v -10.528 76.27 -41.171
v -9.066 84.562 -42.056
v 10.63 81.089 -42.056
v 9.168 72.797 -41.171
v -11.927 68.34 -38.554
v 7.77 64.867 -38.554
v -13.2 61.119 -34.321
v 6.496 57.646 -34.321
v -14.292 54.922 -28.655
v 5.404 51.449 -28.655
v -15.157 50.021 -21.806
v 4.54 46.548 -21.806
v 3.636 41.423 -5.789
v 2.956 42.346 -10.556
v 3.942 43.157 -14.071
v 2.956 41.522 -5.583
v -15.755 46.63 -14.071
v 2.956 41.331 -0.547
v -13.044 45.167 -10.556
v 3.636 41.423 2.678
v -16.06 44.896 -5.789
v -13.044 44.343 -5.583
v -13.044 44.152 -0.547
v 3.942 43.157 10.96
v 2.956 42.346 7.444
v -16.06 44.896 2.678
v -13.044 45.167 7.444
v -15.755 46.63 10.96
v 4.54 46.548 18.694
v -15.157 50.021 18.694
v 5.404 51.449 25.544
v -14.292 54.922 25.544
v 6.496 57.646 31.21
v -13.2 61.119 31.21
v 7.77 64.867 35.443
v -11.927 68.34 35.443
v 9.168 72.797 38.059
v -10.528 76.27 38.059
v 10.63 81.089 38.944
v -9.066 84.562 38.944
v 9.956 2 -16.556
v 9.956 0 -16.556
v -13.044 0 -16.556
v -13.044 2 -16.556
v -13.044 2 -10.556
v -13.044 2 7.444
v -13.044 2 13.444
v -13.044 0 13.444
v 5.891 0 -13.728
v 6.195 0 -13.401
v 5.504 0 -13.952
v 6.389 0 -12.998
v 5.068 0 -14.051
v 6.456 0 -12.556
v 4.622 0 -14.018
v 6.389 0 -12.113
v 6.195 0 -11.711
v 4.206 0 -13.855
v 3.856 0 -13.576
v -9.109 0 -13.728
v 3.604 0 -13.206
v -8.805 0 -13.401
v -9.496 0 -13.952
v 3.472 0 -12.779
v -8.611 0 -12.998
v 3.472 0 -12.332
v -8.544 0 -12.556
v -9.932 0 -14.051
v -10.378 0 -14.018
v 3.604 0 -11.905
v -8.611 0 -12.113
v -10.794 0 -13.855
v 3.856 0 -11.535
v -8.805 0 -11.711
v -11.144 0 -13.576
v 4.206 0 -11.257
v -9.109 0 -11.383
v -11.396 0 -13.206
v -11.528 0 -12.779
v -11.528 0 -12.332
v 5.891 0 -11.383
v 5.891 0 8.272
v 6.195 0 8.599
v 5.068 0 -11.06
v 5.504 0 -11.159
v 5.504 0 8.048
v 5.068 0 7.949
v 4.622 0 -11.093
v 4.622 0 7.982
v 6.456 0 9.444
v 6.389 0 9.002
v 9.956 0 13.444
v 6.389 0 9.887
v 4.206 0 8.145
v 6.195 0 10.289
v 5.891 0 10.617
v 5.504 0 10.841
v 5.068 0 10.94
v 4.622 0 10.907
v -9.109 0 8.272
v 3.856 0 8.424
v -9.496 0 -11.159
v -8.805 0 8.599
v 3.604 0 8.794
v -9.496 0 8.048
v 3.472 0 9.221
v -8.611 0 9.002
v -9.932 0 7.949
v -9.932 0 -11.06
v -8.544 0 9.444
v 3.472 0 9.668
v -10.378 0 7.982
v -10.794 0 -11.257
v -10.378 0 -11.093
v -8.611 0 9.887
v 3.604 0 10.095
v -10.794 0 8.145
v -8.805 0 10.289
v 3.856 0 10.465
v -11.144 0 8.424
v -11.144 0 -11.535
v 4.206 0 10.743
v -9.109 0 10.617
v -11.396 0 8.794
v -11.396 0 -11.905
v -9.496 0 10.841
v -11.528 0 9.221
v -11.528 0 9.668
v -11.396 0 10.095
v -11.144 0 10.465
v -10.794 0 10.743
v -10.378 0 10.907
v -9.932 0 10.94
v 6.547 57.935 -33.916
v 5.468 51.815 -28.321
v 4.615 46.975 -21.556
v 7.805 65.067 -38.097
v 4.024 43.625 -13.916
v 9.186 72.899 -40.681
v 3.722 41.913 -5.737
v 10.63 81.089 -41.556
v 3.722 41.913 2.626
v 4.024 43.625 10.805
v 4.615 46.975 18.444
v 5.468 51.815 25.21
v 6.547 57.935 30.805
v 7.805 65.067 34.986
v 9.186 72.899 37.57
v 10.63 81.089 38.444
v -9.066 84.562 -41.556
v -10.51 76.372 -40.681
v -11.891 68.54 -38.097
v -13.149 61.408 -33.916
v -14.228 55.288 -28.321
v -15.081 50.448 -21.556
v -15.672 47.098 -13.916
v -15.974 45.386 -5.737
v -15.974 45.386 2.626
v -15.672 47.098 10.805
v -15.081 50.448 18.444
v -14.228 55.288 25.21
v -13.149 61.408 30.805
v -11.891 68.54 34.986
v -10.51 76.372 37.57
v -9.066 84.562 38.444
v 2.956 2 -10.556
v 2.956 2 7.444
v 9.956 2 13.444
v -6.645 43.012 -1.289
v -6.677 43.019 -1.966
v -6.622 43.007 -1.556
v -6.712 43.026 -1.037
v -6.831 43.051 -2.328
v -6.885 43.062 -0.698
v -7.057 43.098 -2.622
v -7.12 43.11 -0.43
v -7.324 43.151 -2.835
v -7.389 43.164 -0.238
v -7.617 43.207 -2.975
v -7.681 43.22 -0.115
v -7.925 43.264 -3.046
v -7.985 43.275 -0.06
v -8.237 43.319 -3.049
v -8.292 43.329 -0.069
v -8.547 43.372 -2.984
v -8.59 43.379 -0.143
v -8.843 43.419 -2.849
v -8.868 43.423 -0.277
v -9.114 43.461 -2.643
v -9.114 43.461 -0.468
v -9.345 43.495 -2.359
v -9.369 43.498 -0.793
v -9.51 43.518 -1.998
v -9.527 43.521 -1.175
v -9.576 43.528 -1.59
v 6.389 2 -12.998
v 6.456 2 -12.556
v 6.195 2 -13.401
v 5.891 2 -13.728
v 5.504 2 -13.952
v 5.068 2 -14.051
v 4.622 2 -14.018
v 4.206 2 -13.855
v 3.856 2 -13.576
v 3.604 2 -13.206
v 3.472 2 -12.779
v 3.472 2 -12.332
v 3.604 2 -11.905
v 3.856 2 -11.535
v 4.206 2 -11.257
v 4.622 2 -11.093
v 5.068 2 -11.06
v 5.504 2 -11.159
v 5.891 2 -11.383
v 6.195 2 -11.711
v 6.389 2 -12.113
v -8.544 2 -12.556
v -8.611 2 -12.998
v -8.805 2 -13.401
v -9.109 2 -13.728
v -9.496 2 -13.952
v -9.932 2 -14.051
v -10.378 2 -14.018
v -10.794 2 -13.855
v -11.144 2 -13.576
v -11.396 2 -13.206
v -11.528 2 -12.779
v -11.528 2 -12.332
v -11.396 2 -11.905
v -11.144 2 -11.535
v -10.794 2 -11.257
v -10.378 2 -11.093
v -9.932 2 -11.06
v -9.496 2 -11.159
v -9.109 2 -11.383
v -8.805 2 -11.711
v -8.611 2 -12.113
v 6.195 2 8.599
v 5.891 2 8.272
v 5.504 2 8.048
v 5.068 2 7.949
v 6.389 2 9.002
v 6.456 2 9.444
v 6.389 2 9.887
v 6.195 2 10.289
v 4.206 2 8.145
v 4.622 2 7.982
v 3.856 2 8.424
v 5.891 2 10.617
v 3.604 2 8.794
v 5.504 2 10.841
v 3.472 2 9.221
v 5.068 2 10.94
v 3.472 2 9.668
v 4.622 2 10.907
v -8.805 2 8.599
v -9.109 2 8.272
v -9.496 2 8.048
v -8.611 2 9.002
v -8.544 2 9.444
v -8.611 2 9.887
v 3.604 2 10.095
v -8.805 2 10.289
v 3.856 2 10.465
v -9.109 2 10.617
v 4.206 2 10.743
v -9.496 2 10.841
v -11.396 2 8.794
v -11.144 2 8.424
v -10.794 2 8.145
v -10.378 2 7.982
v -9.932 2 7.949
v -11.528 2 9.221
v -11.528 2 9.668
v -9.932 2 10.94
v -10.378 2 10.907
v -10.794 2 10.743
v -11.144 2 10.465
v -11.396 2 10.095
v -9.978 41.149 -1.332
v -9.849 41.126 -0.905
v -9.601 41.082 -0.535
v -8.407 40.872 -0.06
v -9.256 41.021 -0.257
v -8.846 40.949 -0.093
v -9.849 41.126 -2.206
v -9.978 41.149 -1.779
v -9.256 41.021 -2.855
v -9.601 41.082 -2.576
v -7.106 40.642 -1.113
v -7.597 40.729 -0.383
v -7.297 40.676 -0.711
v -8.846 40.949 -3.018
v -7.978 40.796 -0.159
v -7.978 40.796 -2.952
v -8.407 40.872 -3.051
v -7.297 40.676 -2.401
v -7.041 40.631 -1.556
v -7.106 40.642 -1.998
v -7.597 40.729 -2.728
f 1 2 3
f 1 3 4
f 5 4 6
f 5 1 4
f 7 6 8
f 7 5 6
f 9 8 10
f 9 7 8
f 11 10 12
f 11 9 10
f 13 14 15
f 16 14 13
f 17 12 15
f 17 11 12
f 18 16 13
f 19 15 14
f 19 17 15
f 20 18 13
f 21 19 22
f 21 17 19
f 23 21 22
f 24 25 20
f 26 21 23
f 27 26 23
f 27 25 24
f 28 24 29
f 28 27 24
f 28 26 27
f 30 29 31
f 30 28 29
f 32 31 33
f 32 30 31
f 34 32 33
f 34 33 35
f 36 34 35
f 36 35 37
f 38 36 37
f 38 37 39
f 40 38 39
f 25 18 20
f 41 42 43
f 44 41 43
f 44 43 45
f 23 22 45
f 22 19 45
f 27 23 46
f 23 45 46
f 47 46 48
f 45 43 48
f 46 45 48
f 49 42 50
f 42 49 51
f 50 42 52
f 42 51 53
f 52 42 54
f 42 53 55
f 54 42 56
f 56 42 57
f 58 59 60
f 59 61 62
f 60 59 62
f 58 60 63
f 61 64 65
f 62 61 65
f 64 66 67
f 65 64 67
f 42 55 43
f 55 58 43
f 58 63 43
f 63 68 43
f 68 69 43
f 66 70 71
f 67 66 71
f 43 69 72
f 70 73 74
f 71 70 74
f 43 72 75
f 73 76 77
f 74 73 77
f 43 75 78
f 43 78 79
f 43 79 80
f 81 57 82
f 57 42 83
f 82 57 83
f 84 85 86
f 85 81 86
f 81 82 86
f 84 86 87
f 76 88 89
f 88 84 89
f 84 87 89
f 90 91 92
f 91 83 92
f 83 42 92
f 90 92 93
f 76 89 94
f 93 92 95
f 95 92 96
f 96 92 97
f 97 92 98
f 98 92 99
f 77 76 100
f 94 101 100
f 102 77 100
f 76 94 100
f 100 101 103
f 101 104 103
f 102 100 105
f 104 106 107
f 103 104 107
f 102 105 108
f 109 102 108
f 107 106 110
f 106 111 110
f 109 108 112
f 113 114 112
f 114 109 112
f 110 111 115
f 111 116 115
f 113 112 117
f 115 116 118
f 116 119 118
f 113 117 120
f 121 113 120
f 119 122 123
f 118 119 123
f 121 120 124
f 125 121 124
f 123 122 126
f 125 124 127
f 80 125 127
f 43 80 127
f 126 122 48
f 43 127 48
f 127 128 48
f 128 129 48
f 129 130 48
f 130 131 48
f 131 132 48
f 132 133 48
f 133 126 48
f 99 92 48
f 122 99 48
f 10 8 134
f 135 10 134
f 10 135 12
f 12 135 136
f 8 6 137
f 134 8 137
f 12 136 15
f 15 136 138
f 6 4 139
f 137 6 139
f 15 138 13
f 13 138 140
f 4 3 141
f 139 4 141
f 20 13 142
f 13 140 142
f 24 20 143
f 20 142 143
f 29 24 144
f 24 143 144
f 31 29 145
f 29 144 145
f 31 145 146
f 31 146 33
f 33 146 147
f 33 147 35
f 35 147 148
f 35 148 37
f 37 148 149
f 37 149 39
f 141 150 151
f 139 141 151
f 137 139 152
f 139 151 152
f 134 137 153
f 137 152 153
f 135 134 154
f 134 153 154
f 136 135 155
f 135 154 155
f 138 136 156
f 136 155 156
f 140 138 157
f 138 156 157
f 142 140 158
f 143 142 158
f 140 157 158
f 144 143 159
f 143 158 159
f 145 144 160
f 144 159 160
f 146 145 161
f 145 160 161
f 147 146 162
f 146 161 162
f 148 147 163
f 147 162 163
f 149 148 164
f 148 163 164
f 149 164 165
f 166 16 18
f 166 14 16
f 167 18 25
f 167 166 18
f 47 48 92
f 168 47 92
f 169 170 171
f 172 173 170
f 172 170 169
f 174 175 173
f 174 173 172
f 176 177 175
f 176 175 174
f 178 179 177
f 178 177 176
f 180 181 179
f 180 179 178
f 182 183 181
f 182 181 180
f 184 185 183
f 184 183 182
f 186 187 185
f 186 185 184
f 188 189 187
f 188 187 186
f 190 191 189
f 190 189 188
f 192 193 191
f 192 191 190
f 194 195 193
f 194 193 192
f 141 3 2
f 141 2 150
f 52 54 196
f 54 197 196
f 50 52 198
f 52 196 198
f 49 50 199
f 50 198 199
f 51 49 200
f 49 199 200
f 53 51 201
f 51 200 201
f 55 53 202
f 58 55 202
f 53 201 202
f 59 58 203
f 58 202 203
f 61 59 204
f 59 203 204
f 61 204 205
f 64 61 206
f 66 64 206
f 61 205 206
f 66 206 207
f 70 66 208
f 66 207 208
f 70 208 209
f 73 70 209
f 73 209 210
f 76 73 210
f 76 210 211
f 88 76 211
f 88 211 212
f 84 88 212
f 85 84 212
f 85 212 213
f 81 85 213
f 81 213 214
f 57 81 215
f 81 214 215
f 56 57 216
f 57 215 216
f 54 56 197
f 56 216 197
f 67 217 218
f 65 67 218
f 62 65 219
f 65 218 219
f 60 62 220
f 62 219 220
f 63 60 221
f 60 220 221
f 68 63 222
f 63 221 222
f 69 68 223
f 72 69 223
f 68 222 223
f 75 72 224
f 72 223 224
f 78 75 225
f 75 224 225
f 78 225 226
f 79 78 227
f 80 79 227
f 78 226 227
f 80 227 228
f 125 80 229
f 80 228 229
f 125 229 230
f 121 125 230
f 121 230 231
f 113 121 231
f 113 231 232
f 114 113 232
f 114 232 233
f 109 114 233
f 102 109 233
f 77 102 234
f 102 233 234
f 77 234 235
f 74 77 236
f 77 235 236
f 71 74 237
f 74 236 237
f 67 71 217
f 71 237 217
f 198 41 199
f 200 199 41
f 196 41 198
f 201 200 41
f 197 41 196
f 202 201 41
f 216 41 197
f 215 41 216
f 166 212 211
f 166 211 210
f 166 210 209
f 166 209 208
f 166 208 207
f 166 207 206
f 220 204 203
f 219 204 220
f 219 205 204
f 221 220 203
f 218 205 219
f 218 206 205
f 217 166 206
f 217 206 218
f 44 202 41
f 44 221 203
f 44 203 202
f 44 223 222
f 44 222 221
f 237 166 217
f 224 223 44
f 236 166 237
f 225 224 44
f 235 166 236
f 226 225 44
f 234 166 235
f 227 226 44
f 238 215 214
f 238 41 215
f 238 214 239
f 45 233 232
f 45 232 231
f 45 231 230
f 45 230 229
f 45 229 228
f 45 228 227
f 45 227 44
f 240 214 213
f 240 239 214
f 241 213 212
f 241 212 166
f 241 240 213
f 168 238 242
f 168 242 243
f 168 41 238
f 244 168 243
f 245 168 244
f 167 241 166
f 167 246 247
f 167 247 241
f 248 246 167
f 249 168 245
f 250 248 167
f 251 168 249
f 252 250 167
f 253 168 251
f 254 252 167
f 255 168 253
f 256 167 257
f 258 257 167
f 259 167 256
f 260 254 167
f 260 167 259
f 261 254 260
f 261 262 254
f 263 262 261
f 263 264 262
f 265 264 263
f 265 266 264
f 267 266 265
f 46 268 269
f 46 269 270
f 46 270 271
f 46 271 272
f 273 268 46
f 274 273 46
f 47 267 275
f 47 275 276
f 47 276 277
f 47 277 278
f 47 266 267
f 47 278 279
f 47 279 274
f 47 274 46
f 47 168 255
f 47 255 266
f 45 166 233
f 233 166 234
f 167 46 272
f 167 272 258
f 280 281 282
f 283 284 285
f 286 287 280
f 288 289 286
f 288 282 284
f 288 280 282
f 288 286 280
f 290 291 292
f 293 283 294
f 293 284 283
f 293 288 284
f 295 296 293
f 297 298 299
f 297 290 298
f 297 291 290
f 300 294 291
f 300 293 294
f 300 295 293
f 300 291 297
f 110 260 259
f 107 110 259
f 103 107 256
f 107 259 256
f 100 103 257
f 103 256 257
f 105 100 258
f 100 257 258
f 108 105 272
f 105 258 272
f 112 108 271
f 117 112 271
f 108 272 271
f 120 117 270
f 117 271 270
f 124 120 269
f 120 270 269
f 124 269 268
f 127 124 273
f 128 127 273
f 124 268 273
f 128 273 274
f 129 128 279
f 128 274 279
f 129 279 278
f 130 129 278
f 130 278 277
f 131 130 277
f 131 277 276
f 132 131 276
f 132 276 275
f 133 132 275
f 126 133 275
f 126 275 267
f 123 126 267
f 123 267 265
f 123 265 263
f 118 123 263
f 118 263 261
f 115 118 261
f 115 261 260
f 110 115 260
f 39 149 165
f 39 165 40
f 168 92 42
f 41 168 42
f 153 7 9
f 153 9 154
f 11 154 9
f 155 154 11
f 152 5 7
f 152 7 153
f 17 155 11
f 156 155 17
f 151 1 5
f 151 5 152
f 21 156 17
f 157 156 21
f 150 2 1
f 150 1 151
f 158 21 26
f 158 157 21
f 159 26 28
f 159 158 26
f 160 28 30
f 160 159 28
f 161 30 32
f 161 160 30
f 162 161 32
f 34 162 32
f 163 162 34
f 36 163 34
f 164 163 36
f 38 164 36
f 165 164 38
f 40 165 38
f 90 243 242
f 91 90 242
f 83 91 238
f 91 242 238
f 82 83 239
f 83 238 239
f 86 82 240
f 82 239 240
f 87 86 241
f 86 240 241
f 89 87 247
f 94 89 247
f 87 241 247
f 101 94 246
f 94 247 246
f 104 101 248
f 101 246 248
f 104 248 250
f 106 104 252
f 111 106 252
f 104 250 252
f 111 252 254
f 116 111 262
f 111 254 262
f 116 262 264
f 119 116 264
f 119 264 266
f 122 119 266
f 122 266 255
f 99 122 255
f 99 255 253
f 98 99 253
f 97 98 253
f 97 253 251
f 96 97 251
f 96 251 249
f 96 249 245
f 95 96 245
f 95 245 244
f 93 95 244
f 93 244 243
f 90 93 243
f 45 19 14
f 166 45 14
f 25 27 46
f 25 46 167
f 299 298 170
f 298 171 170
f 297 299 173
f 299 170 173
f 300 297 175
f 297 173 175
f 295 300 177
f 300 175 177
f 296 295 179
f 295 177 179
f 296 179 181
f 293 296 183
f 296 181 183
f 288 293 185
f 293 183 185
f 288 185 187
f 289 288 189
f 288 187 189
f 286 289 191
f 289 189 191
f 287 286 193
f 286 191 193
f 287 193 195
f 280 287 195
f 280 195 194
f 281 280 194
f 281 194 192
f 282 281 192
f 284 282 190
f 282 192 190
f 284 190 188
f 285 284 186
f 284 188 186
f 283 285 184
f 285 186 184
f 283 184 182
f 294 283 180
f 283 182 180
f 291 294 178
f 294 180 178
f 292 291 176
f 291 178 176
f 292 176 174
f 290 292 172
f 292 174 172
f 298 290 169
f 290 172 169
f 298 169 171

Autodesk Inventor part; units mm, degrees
ref_plane "YZ Plane" through (0, 0, 0) normal (1, 0, 0) x (0, 1, 0)
ref_plane "XZ Plane" through (0, 0, 0) normal (0, 1, 0) x (-1, 0, 0)
sketch "草图1" plane through (0, 0, 0) normal (0, 1, 0) x (-1, 0, 0)
  line L0 (20.0444, 13.4444) -> (-9.9556, 13.4444)
  line L1 (-9.9556, 13.4444) -> (-9.9556, -16.5556)
  line L2 (-9.9556, -16.5556) -> (20.0444, -16.5556)
  line L3 (20.0444, -16.5556) -> (20.0444, 13.4444)
  line L4 (0.0444, 13.4444) -> (-7.4556, 13.4444)
  line L5 (0.0444, 13.4444) -> (7.5444, 13.4444)
  dimension "d0" = 30
  dimension "d1" = 30
extrude "拉伸1" add sketch "草图1" along normal blind 2
sketch "草图2" plane through (0, 2, 0) normal (0, 1, 0) x (1, 0, 0)
  line L0 (9.9556, 16.5556) -> (-20.0444, 16.5556) projected
  circle A0 centre (4.9556, 12.5556) radius 1.5
  circle A1 centre (-10.0444, 12.5556) radius 1.5
  circle A2 centre (-10.0444, -9.4444) radius 1.5
  circle A3 centre (4.9556, -9.4444) radius 1.5
  line L1 (-10.0444, 12.5556) -> (-10.0444, 16.5556)
  line L2 (4.9556, 12.5556) -> (4.9556, 16.5556)
  line L3 (-10.0444, -9.4444) -> (-10.0444, -13.4444)
  line L4 (-20.0444, -13.4444) -> (9.9556, -13.4444) projected
  line L5 (4.9556, -9.4444) -> (4.9556, -13.4444)
  line L6 (9.9556, -13.4444) -> (9.9556, 16.5556) projected
  line L7 (-20.0444, 16.5556) -> (-20.0444, -13.4444) projected
  point P0 (0, 0)
  dimension "d15" = 3
  dimension "d16" = 3
  dimension "d17" = 3
  dimension "d108" = 4
  dimension "d109" = 4
  dimension "d110" = 4
  dimension "d111" = 4
  dimension "d112" = 5
  dimension "d113" = 10
extrude "拉伸2" cut sketch "草图2" against normal blind 2 contours A0 | A1 | A2 | A3
sketch "草图3" plane through (0, 2, 0) normal (0, 1, 0) x (1, 0, 0)
  circle A0 centre (4.9556, 12.5556) radius 1.5 projected
  circle A1 centre (-10.0444, -9.4444) radius 1.5 projected
  line L0 (2.9556, 10.5556) -> (2.9556, -7.4444)
  line L1 (-13.0444, 10.5556) -> (-13.0444, -7.4444)
  line L2 (-13.0444, -7.4444) -> (2.9556, -7.4444)
  line L3 (-13.0444, 10.5556) -> (2.9556, 10.5556)
  line L4 (-22.598, 1.5556) -> (13.9828, 1.5556)
  point P0 (0, 0)
  dimension "d137" = 11
extrude "拉伸3" add sketch "草图3" along normal blind 60 contours L0 L4 L1 L3 | L0 L2 L1 L4
chamfer "倒角5" distance 16 angle 10 1 edges at (2.9556, 62, -1.5556) measured on face at (-2.3778, 62, 1.4444)
sketch "草图29" plane through (0, 2, 0) normal (0, 1, 0) x (1, 0, 0)
  line L0 (-13.0444, -7.4444) -> (-13.0444, 10.5556) projected
  line L1 (-13.0444, 10.5556) -> (-20.9964, 10.5556)
  line L2 (-20.9964, 10.5556) -> (-20.9964, -16.1821)
  line L3 (-20.9964, -16.1821) -> (-13.0444, -16.1821)
  line L4 (-13.0444, -16.1821) -> (-13.0444, 10.5556)
  line L5 (-13.0444, 10.5556) -> (-22.8537, 10.5556)
  line L6 (-22.8537, 10.5556) -> (-22.8537, 28.4787)
  line L7 (-22.8537, 28.4787) -> (-13.0444, 28.4787)
  line L8 (-13.0444, 28.4787) -> (-13.0444, 10.5556)
  point P0 (0, 0)
  point P1 (-20.0444, -13.4444)
extrude "拉伸15" cut sketch "草图29" against normal blind 20
sketch "草图31" plane through (-13.0444, 62, 7.4444) normal (0.1736, 0.9848, 0) x (0.9848, -0.1736, 0)
  line L0 (0, 18) -> (0, 0) projected
  line L1 (0, 9) -> (16.2468, 9)
  line L2 (16.2468, 0) -> (16.2468, 18) projected
  circle A0 centre (8.1234, 9) radius 1.5
  point P0 (23.6125, 7.4444)
  dimension "d134" = 3
extrude "拉伸16" cut sketch "草图31" against normal blind 20
ref_plane "工作平面4" through (-13.0444, 62, -10.5556) normal (-0.9848, 0.1736, 0) x (0, 0, 1)
ref_plane "工作平面3" through (2.9556, 59.1788, -1.5556) normal (0.1736, 0.9848, 0) x (0.9848, -0.1736, 0)
sketch "草图36" plane through (-13.0444, 62, -10.5556) normal (-0.9848, 0.1736, 0) x (0, 0, 1)
  line L0 (18, 0) -> (0, 0) projected
  circle A0 centre (9, 0) radius 15
  point P0 (10.5556, -58.7929)
  dimension "d140" = 30
extrude "拉伸17" cut sketch "草图36" against normal blind 200
sketch "草图38" plane through (-13.0444, 62, -10.5556) normal (-0.9848, 0.1736, 0) x (0, 0, 1)
  line L0 (9, -17.5895) -> (9, 63.4105)
  circle A0 centre (9, 22.9105) radius 40.5
  point P0 (10.5556, -58.7929)
  dimension "d143" = 81
extrude "拉伸18" add sketch "草图38" against normal blind 20
sketch "草图39" plane through (-9.0661, 84.5624, -1.5556) normal (-0.9848, 0.1736, 0) x (0, 0, 1)
  line L0 (-48.0605, 0) -> (68.7188, 0)
  line L1 (68.7188, 0) -> (68.7188, 57.1611)
  line L2 (68.7188, 57.1611) -> (-48.0605, 57.1611)
  line L3 (-48.0605, 57.1611) -> (-48.0605, 0)
  point P0 (1.5556, -81.7034)
extrude "拉伸19" cut sketch "草图39" against normal through all
sketch "草图41" plane through (-13.0444, 62, -10.5556) normal (-0.9848, 0.1736, 0) x (0, 0, 1)
  line L0 (49.5, 22.9105) -> (-31.5, 22.9105) projected
  circle A0 centre (9, 22.9105) radius 40
  point P0 (10.5556, -58.7929)
  dimension "d148" = 80
extrude "拉伸20" cut sketch "草图41" against normal blind 20
equation "\"折弯半径\" = 厚度"
equation "\"折弯释压宽度\" = 厚度"
equation "\"折弯释压深度\" = 0.5 * 厚度"
equation "\"拐角释压尺寸\" = 4 * 厚度"
equation "\"最小余量\" = 2 * 厚度"
equation "\"过渡半径\" = 折弯半径"
equation "\"Jacobi半径尺寸\" = 折弯半径"
equation "\"间隙大小\" = 厚度"
equation "\"厚度\" = 0.5"
properties part number "_3D 打印"
